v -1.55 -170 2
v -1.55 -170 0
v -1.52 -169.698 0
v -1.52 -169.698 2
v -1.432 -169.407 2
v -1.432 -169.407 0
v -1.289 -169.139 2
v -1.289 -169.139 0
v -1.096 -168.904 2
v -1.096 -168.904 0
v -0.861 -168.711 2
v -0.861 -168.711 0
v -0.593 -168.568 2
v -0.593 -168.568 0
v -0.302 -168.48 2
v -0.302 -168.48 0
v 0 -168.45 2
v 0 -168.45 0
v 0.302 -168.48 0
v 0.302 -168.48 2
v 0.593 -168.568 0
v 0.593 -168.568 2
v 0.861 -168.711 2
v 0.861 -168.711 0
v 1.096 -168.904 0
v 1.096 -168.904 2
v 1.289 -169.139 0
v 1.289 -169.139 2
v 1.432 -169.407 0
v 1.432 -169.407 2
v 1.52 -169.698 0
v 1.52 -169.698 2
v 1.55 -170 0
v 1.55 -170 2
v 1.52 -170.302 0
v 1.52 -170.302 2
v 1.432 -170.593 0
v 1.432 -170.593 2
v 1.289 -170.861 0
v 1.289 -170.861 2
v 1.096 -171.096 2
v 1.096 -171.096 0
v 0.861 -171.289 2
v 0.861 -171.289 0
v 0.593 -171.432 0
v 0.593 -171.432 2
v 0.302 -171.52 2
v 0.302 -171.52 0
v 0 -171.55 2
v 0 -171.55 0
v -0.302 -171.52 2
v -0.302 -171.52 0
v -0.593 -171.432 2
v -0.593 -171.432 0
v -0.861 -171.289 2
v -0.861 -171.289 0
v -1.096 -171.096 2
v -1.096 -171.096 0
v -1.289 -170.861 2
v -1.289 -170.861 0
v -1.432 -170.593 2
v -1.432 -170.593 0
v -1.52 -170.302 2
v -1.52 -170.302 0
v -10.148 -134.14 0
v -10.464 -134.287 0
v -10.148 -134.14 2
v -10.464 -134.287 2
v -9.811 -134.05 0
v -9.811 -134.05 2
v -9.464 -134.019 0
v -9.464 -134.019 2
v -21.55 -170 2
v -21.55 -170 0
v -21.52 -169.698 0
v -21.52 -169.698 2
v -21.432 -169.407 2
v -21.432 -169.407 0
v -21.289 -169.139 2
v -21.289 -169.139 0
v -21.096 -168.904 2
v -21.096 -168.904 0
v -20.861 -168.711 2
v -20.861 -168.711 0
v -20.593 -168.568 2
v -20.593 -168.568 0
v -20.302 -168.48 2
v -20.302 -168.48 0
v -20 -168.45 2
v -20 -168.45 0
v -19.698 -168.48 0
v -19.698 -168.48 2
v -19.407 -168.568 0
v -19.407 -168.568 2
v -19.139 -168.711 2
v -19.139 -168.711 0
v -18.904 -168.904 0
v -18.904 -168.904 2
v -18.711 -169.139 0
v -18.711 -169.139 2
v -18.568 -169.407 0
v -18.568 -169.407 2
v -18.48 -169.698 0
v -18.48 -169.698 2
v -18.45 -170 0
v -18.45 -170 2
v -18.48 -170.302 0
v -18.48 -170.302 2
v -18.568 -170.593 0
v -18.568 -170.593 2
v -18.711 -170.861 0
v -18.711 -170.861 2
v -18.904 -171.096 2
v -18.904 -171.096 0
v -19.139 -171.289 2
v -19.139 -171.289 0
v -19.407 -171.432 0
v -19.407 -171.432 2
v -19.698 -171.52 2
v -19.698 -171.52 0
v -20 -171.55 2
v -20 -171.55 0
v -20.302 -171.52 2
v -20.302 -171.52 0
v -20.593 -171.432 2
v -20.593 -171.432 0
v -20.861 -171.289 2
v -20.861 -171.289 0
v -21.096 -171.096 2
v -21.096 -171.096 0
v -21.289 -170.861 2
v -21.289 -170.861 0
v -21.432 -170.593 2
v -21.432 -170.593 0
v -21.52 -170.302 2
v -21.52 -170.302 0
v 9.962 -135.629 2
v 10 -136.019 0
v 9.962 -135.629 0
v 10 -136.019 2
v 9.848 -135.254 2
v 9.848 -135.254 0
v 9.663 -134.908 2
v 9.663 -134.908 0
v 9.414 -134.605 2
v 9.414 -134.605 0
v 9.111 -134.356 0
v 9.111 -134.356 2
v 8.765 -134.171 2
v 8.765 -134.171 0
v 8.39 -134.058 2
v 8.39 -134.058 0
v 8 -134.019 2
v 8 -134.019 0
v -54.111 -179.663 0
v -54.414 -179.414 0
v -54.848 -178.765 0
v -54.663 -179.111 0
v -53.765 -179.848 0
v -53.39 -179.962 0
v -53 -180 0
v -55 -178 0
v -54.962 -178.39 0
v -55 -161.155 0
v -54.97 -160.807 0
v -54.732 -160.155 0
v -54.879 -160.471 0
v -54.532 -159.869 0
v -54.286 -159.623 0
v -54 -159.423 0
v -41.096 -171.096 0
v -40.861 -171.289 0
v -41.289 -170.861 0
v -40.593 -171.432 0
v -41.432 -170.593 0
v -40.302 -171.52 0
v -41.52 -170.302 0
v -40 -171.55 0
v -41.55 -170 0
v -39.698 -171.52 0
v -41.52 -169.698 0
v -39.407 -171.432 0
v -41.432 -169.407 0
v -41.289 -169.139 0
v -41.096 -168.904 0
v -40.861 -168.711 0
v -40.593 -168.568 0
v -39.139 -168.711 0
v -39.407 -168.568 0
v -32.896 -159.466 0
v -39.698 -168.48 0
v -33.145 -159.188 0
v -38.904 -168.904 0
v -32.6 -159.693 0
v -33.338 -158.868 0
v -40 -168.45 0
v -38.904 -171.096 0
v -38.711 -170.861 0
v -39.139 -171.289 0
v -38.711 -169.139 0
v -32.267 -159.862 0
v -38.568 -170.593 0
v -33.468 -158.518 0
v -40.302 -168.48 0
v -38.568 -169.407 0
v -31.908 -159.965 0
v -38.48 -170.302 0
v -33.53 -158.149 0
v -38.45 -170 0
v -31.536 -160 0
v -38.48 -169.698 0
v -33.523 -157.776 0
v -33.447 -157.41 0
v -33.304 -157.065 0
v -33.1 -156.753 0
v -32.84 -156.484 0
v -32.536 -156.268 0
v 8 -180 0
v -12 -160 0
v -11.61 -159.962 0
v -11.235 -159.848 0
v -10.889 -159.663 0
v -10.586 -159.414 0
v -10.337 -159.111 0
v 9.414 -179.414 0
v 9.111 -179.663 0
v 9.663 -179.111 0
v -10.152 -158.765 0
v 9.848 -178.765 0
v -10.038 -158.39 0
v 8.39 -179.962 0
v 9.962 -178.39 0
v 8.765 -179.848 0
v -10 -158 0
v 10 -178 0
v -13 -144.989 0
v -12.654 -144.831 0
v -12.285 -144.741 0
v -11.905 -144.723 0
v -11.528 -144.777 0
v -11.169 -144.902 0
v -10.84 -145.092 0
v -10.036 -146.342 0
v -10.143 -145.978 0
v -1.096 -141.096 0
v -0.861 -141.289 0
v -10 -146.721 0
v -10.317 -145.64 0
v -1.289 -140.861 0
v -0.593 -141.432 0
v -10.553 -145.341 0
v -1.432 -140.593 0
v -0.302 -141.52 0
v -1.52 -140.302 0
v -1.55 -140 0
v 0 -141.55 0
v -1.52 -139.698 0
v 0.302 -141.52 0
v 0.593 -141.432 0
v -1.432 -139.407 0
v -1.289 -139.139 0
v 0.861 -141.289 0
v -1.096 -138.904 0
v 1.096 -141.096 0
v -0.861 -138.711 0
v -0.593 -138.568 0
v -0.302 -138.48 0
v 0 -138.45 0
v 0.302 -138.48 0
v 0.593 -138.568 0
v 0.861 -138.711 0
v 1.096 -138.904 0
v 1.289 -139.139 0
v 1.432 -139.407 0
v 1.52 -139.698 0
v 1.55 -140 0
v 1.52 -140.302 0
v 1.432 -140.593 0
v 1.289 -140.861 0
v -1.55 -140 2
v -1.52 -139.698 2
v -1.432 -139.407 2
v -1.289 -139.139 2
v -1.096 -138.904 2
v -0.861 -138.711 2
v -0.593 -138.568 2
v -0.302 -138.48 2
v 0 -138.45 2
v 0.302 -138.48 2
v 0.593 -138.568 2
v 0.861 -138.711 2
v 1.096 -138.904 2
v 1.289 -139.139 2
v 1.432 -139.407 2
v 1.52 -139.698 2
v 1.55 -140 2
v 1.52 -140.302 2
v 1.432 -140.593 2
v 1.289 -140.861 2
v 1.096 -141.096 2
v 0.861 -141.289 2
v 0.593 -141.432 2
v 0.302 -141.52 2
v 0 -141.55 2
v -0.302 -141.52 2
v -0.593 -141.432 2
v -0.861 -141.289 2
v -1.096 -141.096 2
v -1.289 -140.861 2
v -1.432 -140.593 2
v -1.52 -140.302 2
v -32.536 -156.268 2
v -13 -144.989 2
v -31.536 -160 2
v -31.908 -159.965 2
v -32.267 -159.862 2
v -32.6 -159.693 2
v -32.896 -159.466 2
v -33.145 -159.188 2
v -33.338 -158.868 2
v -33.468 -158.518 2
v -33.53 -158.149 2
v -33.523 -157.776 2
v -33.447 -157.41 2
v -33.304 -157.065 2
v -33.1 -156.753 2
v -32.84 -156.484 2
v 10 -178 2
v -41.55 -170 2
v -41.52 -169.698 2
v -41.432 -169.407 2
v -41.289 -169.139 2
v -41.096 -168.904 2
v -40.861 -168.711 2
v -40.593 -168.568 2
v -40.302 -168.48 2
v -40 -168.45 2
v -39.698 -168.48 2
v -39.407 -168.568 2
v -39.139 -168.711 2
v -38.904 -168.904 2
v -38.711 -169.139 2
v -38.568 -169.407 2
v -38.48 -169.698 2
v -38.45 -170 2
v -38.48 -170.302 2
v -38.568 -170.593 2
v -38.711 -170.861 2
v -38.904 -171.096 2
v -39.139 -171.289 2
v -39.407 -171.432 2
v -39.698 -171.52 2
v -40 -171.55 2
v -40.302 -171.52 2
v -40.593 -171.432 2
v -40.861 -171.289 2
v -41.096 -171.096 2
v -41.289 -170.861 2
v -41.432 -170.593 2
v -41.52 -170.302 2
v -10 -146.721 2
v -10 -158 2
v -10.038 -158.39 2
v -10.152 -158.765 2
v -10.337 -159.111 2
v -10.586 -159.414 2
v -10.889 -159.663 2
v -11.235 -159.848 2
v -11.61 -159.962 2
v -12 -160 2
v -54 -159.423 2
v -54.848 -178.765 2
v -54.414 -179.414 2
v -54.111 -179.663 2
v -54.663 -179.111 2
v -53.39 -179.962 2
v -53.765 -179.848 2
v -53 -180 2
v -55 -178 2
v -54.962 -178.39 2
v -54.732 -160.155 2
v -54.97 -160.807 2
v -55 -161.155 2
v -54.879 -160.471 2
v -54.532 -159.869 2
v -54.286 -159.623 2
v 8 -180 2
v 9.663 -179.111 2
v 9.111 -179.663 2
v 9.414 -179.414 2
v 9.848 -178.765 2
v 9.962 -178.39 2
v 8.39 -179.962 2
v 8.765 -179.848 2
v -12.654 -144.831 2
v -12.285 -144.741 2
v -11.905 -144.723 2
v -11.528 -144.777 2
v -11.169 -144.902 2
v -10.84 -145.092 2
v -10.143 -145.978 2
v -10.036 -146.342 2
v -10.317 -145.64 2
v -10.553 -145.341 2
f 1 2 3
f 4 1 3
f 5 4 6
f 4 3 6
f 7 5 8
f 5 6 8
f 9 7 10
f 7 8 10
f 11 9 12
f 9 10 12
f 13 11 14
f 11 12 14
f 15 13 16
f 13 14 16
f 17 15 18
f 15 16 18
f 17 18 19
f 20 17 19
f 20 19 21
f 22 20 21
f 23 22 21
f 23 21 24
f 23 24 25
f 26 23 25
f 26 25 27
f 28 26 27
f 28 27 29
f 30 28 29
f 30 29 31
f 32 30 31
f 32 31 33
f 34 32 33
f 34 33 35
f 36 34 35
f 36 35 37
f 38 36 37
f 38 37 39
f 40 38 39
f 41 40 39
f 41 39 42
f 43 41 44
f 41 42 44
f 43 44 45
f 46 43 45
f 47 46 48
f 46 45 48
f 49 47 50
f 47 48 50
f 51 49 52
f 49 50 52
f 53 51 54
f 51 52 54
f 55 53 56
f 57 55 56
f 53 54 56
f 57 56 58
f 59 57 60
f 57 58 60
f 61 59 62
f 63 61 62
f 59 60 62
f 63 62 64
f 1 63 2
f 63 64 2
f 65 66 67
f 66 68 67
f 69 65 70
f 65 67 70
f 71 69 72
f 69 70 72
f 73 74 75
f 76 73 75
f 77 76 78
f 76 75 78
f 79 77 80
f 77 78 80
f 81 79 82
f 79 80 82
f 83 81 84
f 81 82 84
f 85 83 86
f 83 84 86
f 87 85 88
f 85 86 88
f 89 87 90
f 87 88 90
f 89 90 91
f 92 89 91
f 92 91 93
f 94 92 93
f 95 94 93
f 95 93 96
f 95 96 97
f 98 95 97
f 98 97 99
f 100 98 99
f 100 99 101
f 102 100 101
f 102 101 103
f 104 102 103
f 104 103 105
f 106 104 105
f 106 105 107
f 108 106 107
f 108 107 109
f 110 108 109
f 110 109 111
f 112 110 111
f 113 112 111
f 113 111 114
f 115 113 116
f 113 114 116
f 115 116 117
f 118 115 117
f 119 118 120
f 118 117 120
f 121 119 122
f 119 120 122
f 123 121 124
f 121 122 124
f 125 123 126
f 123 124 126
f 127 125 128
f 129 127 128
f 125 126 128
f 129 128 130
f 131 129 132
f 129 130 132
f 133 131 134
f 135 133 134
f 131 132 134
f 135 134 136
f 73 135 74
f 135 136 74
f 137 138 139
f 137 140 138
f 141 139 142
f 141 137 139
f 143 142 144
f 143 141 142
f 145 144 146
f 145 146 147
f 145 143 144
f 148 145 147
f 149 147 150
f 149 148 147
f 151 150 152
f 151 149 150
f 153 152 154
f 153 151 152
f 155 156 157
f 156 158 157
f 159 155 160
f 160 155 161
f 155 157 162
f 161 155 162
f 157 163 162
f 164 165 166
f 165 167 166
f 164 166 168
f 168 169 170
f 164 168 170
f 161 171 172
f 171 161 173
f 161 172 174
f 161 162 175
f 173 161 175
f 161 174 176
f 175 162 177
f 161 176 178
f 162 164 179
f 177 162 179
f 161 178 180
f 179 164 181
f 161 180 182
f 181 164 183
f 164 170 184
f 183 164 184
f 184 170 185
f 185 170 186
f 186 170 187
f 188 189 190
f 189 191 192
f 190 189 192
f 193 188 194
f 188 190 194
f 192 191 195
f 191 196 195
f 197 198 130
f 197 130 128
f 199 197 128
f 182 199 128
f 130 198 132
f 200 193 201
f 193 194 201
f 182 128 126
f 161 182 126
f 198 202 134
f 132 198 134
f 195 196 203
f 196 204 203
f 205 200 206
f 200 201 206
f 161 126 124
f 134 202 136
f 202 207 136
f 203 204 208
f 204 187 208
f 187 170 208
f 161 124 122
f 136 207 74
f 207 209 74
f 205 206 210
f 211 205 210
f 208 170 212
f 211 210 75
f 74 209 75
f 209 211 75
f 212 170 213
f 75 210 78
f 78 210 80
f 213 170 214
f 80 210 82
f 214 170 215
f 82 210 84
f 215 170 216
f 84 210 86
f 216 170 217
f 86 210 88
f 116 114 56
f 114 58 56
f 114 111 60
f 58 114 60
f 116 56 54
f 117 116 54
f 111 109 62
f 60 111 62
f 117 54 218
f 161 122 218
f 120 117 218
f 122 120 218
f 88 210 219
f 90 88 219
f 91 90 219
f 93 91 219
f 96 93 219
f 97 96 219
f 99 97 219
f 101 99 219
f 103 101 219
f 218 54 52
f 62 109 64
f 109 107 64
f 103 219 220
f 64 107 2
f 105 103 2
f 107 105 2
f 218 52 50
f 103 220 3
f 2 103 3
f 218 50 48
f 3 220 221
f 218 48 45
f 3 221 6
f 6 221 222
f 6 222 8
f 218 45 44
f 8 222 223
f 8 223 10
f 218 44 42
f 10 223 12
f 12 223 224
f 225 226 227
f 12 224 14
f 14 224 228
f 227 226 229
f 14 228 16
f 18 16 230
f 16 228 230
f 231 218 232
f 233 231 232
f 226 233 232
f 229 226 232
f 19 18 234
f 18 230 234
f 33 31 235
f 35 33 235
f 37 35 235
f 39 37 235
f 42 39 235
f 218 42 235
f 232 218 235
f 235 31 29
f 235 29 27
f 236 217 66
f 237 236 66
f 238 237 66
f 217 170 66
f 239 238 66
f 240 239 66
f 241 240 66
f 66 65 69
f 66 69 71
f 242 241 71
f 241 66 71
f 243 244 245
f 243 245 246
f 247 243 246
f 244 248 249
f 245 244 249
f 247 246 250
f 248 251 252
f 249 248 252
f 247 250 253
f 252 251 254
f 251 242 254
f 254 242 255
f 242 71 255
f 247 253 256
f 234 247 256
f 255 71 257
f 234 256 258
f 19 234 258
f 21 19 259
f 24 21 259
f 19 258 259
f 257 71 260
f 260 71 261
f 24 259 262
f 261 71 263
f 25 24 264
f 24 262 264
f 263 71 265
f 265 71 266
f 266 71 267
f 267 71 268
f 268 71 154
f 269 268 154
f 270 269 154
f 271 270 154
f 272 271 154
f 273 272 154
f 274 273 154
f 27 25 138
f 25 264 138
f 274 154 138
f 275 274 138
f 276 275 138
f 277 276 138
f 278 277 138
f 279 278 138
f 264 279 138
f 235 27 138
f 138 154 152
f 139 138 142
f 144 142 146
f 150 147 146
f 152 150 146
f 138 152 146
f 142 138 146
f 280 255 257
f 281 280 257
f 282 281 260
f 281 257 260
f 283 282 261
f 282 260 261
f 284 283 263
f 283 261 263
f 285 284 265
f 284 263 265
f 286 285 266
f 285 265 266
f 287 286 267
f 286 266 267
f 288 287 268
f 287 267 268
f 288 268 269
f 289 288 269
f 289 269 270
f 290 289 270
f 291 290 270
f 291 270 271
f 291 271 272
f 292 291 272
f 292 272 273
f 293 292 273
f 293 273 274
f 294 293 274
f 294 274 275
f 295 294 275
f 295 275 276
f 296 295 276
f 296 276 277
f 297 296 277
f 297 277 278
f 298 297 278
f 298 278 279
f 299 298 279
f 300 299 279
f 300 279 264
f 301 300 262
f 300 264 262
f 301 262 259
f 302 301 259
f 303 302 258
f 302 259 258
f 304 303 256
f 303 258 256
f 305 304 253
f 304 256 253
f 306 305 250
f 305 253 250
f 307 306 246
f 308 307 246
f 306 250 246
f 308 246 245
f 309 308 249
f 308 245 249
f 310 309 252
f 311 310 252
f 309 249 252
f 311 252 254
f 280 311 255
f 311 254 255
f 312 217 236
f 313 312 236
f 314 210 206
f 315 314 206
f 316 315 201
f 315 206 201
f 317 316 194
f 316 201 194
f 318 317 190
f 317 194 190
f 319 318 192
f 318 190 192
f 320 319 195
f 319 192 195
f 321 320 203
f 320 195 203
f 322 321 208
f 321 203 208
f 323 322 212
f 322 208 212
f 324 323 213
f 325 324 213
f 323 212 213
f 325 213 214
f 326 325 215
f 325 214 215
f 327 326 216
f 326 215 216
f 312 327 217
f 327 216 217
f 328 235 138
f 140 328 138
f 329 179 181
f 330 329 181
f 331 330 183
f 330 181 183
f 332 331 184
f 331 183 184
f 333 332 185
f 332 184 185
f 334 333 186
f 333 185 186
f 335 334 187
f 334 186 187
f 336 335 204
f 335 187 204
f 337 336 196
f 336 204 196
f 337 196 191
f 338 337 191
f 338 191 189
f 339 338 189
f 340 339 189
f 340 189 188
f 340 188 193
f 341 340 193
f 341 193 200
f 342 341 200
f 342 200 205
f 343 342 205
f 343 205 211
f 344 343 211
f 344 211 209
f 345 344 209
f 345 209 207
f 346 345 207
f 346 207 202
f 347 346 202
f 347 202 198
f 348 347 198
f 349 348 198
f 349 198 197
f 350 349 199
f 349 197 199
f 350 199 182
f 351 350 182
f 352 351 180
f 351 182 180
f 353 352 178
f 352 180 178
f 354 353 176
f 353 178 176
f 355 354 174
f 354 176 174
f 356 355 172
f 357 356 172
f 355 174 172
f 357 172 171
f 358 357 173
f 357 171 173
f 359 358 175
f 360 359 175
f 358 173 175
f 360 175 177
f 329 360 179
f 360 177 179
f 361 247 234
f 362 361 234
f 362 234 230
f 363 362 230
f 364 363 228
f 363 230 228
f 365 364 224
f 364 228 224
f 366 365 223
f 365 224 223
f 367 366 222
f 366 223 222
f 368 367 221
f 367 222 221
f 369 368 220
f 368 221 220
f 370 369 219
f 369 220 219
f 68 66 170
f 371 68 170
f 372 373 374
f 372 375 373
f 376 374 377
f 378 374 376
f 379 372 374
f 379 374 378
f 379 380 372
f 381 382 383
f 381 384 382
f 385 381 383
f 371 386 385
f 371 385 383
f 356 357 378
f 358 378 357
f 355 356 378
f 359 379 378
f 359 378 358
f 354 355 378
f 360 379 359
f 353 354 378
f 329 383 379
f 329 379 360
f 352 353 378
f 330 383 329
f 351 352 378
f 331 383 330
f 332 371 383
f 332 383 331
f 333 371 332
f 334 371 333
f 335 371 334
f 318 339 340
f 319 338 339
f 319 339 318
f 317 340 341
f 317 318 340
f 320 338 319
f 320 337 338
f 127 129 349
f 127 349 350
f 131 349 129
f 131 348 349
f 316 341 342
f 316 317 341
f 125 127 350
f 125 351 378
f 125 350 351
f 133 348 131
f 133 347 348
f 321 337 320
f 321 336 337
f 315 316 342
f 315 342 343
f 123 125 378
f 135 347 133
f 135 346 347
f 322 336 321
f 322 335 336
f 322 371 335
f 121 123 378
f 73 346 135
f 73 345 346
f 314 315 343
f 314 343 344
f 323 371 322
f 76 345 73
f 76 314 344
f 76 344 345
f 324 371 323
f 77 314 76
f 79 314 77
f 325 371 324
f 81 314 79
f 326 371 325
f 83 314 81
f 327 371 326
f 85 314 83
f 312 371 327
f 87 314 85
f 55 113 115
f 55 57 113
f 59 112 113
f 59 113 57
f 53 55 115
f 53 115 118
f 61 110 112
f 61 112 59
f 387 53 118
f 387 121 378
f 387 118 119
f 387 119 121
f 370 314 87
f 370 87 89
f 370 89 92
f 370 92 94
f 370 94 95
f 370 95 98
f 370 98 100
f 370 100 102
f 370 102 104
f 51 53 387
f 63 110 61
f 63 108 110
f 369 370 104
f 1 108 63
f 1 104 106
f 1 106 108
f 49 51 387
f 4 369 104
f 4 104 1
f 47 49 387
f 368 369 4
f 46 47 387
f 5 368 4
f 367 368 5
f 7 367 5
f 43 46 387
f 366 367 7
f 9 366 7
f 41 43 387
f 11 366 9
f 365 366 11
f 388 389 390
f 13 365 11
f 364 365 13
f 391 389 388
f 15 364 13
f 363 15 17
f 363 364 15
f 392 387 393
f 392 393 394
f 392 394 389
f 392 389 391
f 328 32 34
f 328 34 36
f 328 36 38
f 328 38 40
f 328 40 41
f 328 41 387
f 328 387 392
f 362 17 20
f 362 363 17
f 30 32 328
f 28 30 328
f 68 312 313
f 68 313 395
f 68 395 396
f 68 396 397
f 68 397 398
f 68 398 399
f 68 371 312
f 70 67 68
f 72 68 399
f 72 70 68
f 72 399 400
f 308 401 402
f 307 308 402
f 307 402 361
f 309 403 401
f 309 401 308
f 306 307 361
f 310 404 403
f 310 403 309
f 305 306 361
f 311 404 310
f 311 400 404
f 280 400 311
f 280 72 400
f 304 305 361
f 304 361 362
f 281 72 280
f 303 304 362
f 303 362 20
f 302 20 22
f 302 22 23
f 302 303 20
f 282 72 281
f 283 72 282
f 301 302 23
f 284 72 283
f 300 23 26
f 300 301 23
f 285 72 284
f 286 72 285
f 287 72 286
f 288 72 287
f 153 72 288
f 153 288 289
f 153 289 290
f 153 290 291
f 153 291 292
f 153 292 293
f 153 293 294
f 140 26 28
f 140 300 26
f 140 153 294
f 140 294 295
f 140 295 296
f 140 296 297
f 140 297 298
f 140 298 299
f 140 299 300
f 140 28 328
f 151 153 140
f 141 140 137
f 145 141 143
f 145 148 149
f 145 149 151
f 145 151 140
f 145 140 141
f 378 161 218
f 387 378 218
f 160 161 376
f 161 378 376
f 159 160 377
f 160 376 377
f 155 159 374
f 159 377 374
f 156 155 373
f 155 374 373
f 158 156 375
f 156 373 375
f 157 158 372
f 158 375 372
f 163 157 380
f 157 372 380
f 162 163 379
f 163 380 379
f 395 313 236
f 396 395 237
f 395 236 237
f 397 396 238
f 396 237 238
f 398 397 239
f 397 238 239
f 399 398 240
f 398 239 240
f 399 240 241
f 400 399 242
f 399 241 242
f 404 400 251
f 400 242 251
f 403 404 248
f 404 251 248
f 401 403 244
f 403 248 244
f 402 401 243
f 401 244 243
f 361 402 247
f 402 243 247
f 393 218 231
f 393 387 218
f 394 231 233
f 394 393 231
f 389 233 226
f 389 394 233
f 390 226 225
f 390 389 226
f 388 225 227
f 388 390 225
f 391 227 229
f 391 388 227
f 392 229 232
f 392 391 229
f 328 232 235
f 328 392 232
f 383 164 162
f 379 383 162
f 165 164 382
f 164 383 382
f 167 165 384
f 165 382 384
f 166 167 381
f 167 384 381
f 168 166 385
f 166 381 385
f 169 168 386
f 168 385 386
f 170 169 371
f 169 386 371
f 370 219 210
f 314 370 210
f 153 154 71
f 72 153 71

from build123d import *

# Parameters (mm, degrees)
EXTRUDE_1_DEPTH     = 2
SKETCH_2_R          = 1.55
CUT_EXTRUDE_1_DEPTH = 3
FILLET_1_R          = 2


with BuildPart() as part:
    # 草图1 → 凸台-拉伸1 (new body)
    with BuildSketch(Plane.XY):
        Polygon((-55, -180), (10, -180), (10, -134.019237886), (-10, -134.019237886), (-55, -160), align=None)
    extrude(amount=EXTRUDE_1_DEPTH)

    # 草图2 → 切除-拉伸1 (cut, through all)
    with BuildSketch(Plane(origin=(0, 0, 0), x_dir=(-1, 0, 0), z_dir=(0, 0, -1))):
        with Locations((40, -170)):
            Circle(SKETCH_2_R)
        with Locations((20, -170)):
            Circle(SKETCH_2_R)
        with Locations((0, -170)):
            Circle(SKETCH_2_R)
        with Locations((0, -140)):
            Circle(SKETCH_2_R)
        with BuildLine():
            Line((12, -160), (31.535898385, -160))
            ThreePointArc((31.535898385, -160), (33.467750037, -158.51763809), (32.535898385, -156.267949192))
            Line((32.535898385, -156.267949192), (13, -144.988893001))
            ThreePointArc((13, -144.988893001), (11, -144.988893001), (10, -146.720943809))
            Line((10, -146.720943809), (10, -158))
            ThreePointArc((10, -158), (10.585786438, -159.414213562), (12, -160))
        make_face()
    extrude(amount=-CUT_EXTRUDE_1_DEPTH, mode=Mode.SUBTRACT)

    # 圆角1
    fillet_1_edges = [part.edges().sort_by_distance(p)[0] for p in [
        (-55, -160, 1),
        (-10, -134.019237886, 1),
        (10, -134.019237886, 1),
        (10, -180, 1),
        (-55, -180, 1),
    ]]
    fillet(fillet_1_edges, radius=FILLET_1_R)


solid = part.part
